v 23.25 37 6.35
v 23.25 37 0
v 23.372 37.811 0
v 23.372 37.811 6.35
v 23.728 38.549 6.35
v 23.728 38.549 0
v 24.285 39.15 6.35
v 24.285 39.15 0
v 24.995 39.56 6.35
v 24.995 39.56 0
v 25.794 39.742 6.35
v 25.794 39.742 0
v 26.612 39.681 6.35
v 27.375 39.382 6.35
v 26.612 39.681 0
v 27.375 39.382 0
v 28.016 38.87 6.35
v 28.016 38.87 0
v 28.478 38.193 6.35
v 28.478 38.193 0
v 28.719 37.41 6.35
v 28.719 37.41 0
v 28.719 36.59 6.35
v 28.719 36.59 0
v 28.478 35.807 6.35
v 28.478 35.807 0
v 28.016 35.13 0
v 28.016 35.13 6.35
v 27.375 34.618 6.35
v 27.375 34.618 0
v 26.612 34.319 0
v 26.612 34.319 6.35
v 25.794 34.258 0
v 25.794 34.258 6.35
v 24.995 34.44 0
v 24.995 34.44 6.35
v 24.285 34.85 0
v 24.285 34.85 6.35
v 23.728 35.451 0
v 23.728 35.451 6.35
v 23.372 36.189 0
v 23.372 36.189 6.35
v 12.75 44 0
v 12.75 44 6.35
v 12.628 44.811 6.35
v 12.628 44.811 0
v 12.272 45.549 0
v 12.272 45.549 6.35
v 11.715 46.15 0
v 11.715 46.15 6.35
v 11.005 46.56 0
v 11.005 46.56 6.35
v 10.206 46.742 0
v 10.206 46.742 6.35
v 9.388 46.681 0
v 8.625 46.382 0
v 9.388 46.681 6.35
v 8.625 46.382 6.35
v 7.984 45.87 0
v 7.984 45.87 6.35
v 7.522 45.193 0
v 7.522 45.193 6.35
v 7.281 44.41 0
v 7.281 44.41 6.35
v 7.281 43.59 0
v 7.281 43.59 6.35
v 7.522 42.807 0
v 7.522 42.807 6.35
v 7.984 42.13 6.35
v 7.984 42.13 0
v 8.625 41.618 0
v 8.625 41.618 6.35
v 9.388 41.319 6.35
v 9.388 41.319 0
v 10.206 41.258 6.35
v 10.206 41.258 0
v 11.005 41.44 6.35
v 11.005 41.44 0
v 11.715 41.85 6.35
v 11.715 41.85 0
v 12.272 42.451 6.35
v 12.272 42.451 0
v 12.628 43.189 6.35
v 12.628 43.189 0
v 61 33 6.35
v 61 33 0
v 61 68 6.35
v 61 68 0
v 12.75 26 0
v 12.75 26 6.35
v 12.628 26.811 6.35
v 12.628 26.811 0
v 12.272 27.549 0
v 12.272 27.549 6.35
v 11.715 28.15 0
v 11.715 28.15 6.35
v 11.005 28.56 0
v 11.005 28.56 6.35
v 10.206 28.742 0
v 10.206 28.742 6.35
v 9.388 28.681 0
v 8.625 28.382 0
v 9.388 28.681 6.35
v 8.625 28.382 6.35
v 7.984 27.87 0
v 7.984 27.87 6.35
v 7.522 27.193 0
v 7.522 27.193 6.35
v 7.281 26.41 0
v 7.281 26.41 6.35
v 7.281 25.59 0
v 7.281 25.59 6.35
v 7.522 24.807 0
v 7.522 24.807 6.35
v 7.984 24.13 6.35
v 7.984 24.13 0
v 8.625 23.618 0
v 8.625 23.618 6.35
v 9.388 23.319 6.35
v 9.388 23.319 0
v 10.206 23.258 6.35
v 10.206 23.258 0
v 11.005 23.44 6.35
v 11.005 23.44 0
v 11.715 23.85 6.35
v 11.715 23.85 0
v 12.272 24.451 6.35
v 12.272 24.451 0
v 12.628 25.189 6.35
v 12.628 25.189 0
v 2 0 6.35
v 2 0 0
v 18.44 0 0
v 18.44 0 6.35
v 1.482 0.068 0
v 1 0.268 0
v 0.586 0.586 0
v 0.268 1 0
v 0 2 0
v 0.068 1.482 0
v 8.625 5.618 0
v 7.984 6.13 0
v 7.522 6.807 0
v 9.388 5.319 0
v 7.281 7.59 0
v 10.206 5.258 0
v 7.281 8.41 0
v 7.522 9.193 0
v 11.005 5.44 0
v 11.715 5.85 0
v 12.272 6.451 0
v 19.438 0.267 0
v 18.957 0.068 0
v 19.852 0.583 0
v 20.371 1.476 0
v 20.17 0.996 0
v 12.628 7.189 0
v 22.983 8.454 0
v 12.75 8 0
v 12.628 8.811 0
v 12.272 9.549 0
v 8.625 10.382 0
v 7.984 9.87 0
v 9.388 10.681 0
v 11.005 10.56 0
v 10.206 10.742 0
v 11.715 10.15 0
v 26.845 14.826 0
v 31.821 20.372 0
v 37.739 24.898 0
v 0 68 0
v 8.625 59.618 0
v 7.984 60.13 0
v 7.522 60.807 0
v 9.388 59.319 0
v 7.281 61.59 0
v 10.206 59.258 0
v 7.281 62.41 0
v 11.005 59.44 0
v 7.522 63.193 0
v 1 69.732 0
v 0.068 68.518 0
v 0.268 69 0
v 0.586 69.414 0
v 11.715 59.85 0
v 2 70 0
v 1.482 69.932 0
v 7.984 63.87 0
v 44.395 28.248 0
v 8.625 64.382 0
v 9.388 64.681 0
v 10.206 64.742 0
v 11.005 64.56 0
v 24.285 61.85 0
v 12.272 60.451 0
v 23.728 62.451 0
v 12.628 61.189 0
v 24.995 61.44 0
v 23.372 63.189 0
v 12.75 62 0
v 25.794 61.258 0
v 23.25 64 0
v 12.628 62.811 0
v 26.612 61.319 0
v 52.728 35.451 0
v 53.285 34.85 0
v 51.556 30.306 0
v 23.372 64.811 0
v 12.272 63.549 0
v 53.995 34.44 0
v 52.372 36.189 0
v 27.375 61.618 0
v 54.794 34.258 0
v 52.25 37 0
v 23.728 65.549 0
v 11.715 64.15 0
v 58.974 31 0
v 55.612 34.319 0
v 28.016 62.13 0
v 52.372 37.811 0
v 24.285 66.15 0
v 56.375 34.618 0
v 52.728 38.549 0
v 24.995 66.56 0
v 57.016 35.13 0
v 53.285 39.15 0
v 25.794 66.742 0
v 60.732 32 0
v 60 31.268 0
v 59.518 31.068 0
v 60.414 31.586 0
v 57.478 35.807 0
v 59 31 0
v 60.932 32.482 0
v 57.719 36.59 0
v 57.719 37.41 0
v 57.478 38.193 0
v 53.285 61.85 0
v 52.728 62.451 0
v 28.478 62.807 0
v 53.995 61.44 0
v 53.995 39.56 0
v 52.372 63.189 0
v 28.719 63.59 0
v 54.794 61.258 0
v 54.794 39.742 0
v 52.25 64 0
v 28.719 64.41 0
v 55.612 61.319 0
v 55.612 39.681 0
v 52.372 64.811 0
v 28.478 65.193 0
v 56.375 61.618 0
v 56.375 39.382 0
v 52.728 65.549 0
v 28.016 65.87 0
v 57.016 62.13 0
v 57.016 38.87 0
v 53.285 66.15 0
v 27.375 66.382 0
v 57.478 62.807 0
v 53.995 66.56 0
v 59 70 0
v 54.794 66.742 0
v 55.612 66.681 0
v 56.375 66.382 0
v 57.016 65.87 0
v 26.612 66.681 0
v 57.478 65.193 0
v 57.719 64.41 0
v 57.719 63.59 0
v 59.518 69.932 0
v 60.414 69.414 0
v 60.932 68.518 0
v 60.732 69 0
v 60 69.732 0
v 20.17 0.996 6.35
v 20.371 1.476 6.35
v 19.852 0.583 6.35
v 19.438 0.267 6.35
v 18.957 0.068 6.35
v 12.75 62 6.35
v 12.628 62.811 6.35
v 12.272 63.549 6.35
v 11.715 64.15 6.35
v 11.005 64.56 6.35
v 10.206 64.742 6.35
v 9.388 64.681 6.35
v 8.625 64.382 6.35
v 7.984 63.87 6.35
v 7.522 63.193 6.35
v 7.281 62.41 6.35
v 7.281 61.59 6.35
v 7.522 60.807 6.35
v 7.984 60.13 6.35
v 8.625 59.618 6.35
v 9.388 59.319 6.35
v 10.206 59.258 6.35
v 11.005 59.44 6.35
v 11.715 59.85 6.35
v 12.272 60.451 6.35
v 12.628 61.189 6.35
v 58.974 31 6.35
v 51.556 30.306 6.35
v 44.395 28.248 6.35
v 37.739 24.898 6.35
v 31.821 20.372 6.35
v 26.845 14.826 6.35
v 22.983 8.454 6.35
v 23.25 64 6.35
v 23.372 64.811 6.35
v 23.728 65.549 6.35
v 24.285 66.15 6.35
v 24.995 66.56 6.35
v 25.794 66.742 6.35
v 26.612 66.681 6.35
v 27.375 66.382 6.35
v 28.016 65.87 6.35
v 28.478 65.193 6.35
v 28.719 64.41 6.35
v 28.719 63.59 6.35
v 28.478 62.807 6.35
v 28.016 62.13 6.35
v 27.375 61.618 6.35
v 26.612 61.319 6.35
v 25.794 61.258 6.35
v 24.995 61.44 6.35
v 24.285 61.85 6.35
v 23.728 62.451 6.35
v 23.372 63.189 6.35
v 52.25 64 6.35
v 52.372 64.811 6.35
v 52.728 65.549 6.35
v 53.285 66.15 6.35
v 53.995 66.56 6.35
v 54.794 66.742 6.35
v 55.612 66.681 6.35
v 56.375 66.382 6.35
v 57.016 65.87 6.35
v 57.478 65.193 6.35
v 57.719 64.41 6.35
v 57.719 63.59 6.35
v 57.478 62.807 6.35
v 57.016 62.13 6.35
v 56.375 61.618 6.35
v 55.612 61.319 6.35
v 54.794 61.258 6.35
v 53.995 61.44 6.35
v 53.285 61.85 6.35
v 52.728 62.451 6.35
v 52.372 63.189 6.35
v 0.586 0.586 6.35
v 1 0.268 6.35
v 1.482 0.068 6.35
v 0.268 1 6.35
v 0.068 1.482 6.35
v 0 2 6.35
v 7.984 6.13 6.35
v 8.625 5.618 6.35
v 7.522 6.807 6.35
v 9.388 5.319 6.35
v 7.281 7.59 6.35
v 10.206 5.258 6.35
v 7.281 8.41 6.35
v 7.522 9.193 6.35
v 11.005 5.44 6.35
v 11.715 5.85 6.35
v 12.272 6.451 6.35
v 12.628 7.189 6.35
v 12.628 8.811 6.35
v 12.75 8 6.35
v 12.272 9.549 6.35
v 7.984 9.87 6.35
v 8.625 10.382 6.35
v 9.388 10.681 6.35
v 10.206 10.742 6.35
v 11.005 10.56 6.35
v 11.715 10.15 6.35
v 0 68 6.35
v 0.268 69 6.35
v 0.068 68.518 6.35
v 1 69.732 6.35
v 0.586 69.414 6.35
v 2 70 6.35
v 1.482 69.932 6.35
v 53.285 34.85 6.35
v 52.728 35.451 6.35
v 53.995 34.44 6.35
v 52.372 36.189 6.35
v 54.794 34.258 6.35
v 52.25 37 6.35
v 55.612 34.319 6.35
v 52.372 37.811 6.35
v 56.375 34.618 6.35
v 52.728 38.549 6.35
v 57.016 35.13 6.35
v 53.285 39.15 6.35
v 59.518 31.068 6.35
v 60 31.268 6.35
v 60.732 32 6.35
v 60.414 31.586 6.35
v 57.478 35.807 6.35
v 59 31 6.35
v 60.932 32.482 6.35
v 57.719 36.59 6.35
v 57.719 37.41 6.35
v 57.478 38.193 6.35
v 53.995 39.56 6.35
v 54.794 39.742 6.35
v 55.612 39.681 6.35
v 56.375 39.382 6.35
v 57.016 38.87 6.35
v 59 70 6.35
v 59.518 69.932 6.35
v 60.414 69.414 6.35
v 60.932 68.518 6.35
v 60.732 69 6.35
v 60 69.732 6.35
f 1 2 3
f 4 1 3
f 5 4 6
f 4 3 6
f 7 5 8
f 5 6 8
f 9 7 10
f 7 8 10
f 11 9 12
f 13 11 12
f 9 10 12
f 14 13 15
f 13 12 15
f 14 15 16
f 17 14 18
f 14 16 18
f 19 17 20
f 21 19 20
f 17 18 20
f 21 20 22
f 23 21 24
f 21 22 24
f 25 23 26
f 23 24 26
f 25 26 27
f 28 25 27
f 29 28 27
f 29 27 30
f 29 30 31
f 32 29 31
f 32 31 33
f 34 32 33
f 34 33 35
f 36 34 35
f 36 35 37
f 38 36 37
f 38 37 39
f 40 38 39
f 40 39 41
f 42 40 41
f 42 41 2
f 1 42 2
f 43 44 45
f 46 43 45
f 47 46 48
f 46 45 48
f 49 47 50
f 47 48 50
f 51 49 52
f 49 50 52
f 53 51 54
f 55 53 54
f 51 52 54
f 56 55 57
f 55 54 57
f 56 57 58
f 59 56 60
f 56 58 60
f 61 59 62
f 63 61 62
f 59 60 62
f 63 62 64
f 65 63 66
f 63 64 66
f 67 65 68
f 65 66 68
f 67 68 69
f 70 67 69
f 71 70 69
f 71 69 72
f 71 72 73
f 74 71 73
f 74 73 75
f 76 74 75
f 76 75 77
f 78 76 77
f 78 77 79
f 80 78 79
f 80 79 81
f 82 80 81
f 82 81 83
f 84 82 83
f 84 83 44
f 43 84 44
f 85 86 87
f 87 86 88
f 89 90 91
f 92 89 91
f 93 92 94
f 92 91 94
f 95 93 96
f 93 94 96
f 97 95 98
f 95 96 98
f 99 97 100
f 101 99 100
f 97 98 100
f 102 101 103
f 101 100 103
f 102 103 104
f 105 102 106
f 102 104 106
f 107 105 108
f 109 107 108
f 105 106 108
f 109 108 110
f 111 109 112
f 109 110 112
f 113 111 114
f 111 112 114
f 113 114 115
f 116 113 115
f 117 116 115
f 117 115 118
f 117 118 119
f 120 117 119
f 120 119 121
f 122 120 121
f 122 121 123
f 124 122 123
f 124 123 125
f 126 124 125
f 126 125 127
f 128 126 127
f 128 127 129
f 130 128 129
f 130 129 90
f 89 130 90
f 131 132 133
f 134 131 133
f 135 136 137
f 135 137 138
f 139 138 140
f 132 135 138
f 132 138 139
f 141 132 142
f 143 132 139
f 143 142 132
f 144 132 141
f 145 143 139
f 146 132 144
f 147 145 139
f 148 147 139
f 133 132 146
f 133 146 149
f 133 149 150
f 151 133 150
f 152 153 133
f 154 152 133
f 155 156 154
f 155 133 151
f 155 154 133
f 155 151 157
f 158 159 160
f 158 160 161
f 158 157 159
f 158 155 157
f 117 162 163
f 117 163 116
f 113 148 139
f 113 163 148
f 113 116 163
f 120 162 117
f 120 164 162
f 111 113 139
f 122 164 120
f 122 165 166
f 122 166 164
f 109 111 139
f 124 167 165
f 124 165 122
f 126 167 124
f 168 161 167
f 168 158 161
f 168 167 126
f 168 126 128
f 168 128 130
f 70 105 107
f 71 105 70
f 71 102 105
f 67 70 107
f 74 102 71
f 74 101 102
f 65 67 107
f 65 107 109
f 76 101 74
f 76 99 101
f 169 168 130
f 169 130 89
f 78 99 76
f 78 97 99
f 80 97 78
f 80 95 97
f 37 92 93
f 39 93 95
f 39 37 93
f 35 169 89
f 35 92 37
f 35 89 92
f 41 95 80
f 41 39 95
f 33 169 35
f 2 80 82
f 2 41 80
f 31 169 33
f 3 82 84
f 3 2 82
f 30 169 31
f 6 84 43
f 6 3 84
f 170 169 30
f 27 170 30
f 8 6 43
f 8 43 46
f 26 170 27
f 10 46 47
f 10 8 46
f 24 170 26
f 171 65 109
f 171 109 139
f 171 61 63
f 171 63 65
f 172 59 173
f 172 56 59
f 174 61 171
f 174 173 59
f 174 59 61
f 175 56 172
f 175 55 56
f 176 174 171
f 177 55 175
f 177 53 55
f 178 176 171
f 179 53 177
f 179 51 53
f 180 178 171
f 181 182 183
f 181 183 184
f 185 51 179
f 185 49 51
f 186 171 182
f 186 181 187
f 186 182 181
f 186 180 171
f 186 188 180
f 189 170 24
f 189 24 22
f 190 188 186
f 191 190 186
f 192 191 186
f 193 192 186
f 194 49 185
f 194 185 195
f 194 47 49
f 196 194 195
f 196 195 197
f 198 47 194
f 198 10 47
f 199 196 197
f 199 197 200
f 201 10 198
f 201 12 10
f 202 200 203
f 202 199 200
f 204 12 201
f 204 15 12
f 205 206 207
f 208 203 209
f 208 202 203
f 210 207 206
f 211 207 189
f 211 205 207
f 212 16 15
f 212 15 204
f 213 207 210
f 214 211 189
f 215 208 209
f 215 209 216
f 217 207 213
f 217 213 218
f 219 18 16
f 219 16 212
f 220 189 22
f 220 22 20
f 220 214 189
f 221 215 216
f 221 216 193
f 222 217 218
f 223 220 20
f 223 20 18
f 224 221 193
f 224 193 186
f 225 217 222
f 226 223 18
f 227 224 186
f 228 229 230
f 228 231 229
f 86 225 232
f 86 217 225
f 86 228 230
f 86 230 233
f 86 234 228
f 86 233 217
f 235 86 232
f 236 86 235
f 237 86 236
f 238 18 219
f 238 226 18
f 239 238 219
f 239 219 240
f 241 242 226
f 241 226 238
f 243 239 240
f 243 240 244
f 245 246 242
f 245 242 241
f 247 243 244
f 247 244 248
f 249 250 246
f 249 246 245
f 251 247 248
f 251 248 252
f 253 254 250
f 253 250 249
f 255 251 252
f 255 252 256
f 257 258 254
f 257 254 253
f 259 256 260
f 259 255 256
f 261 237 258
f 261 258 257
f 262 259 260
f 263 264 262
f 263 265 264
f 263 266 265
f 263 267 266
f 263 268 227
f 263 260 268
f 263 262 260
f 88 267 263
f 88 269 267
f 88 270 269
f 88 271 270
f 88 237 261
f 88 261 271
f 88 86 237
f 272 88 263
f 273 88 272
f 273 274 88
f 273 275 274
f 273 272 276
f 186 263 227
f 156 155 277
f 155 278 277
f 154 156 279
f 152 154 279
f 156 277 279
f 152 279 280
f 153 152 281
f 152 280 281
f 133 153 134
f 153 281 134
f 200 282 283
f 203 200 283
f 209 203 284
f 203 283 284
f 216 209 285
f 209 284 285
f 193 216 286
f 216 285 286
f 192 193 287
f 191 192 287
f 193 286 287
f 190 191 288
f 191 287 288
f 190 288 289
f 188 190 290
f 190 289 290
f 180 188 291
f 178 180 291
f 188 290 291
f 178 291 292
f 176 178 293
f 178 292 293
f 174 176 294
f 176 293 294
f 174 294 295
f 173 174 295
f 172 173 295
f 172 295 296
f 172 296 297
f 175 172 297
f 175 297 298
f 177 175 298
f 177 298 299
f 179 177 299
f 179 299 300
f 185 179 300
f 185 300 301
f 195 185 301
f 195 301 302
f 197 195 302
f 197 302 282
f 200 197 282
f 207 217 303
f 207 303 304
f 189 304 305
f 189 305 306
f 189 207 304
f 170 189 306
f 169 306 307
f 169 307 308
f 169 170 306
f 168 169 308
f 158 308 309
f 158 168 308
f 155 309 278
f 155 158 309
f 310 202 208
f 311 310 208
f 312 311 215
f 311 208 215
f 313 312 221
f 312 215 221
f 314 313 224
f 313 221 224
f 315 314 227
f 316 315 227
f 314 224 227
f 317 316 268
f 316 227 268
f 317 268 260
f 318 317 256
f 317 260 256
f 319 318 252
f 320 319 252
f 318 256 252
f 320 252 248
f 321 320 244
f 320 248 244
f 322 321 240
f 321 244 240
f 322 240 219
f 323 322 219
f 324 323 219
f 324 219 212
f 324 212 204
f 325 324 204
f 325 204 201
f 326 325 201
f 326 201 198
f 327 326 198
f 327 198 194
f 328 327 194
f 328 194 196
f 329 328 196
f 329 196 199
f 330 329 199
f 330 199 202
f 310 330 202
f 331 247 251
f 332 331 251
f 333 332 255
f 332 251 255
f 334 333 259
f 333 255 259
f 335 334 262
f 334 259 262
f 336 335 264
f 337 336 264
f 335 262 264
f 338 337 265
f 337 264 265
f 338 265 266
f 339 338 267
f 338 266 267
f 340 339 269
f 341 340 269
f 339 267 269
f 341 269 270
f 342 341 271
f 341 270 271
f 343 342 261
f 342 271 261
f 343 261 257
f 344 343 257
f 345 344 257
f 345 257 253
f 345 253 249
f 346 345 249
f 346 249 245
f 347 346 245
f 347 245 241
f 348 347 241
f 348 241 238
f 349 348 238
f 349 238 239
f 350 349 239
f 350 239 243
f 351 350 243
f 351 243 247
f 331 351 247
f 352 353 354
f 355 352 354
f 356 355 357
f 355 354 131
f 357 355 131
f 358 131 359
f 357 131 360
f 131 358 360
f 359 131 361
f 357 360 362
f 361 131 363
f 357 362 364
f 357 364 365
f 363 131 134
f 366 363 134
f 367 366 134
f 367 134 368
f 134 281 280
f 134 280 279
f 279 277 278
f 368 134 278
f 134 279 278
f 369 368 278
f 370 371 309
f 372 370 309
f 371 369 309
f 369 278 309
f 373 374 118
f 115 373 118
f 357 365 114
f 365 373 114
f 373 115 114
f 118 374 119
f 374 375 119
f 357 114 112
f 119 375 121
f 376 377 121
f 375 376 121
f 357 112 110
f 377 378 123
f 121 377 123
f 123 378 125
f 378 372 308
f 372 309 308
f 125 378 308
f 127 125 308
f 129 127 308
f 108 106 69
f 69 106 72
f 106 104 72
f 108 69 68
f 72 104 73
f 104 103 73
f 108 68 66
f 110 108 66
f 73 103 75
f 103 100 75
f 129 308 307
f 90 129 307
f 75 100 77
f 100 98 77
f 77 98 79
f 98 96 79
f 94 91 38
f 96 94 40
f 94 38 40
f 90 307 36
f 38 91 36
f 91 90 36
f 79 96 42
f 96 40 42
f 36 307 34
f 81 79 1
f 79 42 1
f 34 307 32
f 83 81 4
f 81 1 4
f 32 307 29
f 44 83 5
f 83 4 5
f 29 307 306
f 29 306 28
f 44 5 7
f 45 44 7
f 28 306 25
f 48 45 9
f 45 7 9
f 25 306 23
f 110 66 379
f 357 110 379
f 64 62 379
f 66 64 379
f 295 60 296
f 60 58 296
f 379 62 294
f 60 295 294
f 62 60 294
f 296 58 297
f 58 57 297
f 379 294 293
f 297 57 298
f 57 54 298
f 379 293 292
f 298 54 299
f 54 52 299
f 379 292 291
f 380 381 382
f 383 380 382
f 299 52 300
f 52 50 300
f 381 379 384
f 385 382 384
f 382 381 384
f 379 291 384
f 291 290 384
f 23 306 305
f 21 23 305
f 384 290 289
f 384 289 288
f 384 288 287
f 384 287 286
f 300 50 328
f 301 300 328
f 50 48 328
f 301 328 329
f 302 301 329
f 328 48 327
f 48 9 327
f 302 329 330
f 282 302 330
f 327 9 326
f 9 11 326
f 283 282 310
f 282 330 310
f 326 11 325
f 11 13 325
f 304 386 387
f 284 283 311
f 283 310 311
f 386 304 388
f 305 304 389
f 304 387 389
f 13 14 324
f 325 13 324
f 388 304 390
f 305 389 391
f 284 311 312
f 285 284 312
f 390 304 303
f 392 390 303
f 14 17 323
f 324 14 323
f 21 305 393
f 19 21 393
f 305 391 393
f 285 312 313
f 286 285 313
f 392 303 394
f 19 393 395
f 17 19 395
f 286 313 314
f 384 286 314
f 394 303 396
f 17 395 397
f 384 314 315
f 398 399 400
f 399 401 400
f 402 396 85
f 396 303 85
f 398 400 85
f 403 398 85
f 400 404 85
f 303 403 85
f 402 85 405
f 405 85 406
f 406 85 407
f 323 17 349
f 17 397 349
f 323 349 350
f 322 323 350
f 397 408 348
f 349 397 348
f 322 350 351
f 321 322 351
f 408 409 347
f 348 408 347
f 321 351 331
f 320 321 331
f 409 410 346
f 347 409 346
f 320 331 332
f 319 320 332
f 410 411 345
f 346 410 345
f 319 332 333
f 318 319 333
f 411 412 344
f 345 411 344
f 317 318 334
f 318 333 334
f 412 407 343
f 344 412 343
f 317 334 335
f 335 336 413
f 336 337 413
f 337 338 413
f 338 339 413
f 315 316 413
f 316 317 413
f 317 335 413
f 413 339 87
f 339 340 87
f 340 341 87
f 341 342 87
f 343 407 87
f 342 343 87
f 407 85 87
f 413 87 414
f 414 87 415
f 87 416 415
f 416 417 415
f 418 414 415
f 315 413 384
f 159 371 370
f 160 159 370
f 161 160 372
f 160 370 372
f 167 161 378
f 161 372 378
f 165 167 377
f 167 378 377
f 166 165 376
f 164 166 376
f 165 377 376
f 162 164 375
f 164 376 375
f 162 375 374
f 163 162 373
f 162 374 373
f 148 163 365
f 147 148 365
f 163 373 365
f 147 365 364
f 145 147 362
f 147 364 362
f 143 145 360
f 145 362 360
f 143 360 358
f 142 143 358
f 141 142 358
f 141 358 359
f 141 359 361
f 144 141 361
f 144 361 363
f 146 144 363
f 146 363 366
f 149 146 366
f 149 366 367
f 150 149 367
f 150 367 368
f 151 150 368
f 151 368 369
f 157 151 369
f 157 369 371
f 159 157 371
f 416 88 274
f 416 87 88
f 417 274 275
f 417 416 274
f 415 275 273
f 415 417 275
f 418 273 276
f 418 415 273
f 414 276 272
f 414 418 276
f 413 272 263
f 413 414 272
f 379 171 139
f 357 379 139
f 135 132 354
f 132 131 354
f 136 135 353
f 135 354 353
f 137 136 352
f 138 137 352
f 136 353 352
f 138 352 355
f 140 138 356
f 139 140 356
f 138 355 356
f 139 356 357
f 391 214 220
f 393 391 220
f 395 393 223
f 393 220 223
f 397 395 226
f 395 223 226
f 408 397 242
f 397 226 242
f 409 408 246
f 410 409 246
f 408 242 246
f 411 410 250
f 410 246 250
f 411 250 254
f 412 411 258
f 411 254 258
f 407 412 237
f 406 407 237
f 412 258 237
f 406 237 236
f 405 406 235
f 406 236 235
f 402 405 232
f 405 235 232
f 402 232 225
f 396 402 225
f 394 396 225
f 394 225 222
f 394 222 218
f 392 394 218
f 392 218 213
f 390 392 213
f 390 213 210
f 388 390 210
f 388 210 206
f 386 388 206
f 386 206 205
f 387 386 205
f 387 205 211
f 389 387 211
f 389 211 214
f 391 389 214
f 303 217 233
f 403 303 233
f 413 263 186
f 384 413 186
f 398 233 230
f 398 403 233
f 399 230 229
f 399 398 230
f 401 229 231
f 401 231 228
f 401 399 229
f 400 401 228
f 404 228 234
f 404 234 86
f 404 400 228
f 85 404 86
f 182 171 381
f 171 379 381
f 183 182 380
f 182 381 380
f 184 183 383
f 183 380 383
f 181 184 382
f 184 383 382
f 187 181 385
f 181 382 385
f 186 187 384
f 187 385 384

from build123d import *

# Parameters (mm, degrees)
BOSS_EXTRUDE1_DEPTH = 6.35
SKETCH4_R           = 2.75
CUT_EXTRUDE1_DEPTH  = 10
SKETCH5_R           = 2.75
CUT_EXTRUDE2_DEPTH  = 94.06622642
FILLET1_R           = 40
FILLET2_R           = 2


with BuildPart() as part:
    # Sketch2 → Boss-Extrude1 (new body)
    with BuildSketch(Plane.XY):
        Polygon((0, 0), (20, 0), (20, 31), (61, 31), (61, 70), (0, 70), align=None)
    extrude(amount=BOSS_EXTRUDE1_DEPTH)

    # Sketch4 → Cut-Extrude1 (cut)
    with BuildSketch(Plane(origin=(0, 0, 0), x_dir=(-1, 0, 0), z_dir=(0, 0, -1))):
        with Locations((-26, 64)):
            Circle(SKETCH4_R)
        with Locations((-54.999998701, 64)):
            Circle(SKETCH4_R)
        with Locations((-55, 37)):
            Circle(SKETCH4_R)
        with Locations((-26.000001299, 37)):
            Circle(SKETCH4_R)
    extrude(amount=-CUT_EXTRUDE1_DEPTH, mode=Mode.SUBTRACT)

    # Sketch5 → Cut-Extrude2 (cut, through all)
    with BuildSketch(Plane.XY.offset(6.35)):
        with Locations((10, 8)):
            Circle(SKETCH5_R)
        with Locations((10, 26)):
            Circle(SKETCH5_R)
        with Locations((10, 44)):
            Circle(SKETCH5_R)
        with Locations((10, 62)):
            Circle(SKETCH5_R)
    extrude(amount=-CUT_EXTRUDE2_DEPTH, mode=Mode.SUBTRACT)

    # Fillet1
    # the kernel refuses this fillet: 40 mm, written as the material it adds along each edge
    with BuildSketch(Plane(origin=(20, 31, 0), x_dir=(0, -1, 0), z_dir=(0, 0, 1))) as fillet1_piece_1:
        with BuildLine():
            CenterArc((40, 38.97435054), FILLET1_R, 180, 76.997121837)
            Line((0, 38.97435054), (-0.8, 38.97435054))
            Line((-0.8, 38.97435054), (-0.8, 0))
            Line((-0.8, 0), (0, -0.8))
            ThreePointArc((0, -0.8), (15.5, -0.8), (30.82, -0.779487011))
            Line((30.82, -0.779487011), (31, 0))
        make_face()
    extrude(amount=6.35)

    # Fillet2
    fillet2_edges = [part.edges().sort_by_distance(p)[0] for p in [
        (0, 70, 3.175),
        (61, 70, 3.175),
        (61, 31, 3.175),
        (20, 0, 3.175),
        (0, 0, 3.175),
    ]]
    fillet(fillet2_edges, radius=FILLET2_R)


solid = part.part
